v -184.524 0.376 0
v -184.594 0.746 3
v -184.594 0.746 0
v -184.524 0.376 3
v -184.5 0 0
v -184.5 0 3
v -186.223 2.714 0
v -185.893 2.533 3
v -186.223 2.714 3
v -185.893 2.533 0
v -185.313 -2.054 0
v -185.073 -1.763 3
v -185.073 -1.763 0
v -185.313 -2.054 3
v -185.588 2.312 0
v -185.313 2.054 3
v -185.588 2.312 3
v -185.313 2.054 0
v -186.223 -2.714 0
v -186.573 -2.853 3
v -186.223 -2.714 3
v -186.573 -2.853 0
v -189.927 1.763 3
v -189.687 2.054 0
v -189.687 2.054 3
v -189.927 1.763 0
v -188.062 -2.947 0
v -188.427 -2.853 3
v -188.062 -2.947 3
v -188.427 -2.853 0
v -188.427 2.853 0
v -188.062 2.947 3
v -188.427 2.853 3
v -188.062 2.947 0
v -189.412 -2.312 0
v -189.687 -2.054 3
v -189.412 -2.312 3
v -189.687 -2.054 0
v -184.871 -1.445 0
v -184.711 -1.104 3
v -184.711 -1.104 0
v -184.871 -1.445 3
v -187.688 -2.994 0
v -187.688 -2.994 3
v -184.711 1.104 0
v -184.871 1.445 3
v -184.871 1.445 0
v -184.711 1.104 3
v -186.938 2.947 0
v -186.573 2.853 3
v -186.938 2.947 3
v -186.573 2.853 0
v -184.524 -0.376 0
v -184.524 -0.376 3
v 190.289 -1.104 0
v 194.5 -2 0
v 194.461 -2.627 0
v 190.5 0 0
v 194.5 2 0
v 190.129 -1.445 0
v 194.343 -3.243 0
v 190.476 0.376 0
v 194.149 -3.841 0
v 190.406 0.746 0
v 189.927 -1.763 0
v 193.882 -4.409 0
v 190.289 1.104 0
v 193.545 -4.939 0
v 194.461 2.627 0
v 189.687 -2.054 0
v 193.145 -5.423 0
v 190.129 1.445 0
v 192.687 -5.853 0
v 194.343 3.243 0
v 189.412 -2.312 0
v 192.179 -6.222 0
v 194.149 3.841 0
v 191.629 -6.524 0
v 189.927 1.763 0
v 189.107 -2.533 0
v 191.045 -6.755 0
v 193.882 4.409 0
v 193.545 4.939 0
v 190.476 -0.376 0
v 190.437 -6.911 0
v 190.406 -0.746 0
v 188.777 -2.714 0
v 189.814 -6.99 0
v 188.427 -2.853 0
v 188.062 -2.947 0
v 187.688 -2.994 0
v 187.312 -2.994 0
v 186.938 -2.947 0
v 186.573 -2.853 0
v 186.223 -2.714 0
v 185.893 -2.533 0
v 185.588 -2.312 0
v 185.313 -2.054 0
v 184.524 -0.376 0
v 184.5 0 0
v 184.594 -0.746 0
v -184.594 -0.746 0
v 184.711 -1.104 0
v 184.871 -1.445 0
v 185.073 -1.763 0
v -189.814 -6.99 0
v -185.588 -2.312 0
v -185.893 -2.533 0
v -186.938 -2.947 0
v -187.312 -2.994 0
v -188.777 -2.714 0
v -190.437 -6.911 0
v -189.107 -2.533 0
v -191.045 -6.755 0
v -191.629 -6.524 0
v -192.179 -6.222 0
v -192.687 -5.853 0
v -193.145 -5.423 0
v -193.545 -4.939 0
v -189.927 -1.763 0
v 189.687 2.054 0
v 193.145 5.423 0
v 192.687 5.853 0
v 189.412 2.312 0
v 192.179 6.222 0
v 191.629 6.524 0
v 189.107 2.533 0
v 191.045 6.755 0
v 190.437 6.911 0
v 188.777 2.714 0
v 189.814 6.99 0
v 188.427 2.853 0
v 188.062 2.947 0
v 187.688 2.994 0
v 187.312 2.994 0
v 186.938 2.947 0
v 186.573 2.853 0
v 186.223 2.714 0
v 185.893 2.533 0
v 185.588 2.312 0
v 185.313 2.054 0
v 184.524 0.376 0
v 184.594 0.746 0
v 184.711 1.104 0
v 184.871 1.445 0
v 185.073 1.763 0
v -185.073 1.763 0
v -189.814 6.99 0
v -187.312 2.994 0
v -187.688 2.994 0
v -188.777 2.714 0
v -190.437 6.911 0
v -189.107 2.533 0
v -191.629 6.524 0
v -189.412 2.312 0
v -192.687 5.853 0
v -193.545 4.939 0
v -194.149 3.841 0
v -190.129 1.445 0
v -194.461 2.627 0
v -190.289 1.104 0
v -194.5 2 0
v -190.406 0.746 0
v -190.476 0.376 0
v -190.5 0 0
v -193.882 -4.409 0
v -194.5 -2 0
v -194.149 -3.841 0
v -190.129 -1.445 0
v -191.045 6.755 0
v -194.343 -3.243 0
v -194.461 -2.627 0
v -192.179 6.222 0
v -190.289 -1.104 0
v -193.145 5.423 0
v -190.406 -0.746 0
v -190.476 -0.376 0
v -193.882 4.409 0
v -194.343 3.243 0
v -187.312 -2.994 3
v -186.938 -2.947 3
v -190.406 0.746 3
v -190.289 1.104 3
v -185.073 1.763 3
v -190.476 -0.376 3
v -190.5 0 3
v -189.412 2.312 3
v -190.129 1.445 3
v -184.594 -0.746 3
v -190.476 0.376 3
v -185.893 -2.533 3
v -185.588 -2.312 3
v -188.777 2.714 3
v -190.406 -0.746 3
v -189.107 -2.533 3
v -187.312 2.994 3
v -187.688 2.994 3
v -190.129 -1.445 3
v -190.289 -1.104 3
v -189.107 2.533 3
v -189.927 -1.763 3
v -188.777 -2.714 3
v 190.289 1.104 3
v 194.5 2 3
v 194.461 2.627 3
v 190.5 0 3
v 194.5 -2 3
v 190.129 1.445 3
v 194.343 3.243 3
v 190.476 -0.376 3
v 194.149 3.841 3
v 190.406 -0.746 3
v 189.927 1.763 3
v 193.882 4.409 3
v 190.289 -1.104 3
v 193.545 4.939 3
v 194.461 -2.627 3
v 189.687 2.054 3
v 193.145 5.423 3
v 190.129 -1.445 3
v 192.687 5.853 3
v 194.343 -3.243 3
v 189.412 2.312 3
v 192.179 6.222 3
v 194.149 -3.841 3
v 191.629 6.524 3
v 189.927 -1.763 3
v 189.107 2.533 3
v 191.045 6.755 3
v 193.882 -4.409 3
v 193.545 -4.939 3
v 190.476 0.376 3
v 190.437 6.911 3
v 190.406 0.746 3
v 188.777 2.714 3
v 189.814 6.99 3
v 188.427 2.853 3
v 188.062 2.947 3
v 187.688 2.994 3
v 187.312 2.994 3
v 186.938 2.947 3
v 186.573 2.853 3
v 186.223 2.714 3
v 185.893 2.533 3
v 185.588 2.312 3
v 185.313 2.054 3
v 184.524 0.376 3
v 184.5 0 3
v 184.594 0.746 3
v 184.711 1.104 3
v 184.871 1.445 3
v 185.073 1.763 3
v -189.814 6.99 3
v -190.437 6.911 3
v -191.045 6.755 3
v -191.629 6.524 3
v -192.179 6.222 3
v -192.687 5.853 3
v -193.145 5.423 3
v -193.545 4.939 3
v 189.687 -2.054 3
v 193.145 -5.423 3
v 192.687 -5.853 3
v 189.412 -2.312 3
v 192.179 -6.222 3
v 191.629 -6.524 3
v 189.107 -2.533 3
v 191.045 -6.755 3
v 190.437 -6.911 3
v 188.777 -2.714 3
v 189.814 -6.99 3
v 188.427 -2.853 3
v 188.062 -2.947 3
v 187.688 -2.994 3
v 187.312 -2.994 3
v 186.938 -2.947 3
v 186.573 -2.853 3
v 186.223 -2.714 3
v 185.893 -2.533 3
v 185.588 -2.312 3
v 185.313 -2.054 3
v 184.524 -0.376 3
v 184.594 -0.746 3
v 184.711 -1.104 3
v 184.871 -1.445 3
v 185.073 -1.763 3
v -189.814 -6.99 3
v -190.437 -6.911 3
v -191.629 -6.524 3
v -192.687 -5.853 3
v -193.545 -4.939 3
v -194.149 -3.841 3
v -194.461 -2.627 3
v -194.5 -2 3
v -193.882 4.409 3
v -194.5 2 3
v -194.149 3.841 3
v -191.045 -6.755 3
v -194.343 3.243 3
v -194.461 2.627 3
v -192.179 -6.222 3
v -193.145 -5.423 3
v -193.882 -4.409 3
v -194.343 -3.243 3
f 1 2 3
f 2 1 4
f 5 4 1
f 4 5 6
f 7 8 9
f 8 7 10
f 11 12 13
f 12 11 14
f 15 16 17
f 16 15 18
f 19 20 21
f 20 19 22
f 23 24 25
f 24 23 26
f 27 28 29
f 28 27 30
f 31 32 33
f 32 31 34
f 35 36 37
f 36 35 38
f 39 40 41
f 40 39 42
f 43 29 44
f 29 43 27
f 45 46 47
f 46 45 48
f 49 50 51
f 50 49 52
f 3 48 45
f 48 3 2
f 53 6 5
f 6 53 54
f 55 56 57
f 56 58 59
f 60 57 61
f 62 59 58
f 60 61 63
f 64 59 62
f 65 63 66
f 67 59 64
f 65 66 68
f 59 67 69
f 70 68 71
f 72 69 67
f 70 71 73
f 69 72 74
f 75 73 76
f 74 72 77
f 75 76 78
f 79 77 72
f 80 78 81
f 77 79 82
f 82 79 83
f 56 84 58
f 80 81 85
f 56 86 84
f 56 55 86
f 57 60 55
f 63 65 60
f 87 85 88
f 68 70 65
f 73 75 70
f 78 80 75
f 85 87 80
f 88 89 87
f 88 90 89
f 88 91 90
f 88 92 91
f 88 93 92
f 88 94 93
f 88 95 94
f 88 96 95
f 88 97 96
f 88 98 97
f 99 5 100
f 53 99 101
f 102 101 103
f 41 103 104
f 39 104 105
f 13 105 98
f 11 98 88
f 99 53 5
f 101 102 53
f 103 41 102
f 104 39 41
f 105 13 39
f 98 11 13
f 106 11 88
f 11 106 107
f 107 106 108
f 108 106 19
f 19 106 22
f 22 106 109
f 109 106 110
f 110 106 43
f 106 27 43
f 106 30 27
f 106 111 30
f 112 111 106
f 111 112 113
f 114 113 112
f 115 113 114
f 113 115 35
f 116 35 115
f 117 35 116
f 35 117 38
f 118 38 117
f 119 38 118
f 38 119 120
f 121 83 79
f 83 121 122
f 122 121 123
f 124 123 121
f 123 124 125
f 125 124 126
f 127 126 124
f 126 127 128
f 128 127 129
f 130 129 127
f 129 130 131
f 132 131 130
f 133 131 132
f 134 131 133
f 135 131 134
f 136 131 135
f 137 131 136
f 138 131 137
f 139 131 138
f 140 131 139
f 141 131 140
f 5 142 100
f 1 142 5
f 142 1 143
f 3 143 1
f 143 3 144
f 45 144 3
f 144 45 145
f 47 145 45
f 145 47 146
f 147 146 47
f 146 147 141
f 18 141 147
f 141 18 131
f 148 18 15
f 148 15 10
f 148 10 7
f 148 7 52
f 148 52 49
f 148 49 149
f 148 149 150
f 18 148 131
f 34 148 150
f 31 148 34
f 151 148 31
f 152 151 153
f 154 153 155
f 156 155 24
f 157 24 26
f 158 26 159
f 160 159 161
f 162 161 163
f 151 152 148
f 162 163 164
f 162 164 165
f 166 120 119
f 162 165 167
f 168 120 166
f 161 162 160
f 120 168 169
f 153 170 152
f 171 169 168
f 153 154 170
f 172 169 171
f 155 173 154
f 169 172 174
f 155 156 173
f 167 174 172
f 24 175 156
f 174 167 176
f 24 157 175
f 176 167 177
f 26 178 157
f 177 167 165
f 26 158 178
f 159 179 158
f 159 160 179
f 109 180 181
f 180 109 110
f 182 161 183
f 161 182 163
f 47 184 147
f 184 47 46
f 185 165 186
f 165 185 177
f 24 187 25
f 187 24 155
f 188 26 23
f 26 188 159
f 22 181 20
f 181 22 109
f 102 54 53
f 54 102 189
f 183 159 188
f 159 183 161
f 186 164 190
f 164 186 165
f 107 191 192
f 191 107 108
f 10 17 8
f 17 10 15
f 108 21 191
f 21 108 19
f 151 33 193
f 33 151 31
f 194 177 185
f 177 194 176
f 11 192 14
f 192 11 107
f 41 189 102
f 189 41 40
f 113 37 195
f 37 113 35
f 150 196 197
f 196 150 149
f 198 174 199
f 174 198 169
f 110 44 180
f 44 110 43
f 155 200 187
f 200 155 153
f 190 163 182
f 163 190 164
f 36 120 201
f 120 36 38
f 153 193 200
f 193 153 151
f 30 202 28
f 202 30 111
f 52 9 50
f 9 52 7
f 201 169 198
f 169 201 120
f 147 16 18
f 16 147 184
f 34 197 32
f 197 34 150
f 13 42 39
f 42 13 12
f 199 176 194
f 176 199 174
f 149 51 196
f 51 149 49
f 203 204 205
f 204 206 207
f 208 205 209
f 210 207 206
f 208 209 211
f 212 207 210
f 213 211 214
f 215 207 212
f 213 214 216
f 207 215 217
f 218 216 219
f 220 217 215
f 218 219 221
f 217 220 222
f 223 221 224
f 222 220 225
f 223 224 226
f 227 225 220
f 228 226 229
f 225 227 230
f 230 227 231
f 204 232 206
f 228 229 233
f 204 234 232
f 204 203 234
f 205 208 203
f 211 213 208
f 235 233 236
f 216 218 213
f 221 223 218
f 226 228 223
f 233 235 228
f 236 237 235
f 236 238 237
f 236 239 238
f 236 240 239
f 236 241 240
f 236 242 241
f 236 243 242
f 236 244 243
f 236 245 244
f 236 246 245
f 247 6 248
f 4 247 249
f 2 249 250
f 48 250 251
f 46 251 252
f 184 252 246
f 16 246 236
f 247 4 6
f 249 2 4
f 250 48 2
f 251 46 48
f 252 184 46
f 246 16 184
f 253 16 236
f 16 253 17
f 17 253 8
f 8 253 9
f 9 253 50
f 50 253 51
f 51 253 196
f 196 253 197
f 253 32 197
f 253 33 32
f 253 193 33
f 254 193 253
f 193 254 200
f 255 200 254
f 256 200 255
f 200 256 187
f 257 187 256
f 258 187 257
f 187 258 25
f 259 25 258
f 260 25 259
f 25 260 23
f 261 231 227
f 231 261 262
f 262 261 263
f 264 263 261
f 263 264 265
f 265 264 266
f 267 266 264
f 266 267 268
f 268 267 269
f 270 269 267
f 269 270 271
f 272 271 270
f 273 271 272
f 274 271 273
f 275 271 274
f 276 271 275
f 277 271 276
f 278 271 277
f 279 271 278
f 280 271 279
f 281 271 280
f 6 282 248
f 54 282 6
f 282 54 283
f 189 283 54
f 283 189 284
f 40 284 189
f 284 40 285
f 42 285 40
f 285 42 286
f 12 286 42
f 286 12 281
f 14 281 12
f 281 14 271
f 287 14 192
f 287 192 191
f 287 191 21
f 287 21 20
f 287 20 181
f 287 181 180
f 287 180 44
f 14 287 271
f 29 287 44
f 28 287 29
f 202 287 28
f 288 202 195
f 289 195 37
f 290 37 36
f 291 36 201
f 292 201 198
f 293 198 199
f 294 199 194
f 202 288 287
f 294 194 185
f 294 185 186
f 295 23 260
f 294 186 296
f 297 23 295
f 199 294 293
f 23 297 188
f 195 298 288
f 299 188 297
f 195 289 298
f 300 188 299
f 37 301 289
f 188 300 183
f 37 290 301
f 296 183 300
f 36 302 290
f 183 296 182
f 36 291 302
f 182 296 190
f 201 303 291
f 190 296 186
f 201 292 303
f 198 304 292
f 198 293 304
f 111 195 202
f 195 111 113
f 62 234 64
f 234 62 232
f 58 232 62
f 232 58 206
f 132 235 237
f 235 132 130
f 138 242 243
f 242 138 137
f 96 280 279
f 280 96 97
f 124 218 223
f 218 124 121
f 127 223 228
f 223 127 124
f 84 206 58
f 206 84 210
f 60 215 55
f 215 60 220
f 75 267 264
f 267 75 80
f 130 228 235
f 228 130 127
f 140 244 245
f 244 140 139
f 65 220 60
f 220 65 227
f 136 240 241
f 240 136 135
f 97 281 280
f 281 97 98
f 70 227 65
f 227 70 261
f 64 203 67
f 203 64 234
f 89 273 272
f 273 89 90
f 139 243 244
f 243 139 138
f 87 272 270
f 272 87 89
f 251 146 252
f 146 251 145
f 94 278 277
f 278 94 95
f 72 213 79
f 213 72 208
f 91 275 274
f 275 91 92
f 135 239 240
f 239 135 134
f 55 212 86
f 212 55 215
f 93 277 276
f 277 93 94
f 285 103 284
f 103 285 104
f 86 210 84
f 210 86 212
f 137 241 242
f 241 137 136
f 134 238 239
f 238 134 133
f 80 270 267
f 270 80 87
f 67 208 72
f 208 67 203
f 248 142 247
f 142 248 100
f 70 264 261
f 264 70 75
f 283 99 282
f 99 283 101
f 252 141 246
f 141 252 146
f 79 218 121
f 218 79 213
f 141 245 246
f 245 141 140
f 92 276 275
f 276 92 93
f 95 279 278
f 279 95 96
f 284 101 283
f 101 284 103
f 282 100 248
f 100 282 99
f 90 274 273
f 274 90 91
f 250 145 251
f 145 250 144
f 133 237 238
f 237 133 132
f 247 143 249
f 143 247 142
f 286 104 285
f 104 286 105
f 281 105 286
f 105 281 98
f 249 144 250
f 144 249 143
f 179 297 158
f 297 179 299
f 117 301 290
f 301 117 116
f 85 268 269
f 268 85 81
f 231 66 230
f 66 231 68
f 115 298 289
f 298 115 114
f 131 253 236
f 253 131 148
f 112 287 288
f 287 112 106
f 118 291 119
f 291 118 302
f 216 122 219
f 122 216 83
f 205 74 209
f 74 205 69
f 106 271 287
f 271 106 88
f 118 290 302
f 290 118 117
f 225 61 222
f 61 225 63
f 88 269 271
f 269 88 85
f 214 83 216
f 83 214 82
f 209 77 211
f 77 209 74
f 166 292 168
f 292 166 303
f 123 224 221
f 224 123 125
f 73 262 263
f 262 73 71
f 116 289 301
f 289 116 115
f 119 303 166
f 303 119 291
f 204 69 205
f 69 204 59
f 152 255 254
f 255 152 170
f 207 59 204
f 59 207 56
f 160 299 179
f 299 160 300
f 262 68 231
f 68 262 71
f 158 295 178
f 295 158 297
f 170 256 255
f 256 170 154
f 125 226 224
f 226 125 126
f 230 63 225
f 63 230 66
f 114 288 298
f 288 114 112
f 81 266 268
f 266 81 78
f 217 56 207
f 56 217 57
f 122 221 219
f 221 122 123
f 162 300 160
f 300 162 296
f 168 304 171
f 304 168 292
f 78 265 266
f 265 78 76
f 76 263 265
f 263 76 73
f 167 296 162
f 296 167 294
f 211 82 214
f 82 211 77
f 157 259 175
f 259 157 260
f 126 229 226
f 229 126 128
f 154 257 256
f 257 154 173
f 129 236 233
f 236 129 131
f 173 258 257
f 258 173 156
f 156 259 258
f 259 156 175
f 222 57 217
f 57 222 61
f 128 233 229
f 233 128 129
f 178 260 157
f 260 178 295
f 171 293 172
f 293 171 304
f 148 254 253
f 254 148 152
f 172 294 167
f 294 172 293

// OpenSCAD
$fn = 50;


difference() {
	union() {
		hull() {
			translate(v = [-189.5000000000, 2.0000000000, 0]) {
				cylinder(h = 3, r = 5);
			}
			translate(v = [189.5000000000, 2.0000000000, 0]) {
				cylinder(h = 3, r = 5);
			}
			translate(v = [-189.5000000000, -2.0000000000, 0]) {
				cylinder(h = 3, r = 5);
			}
			translate(v = [189.5000000000, -2.0000000000, 0]) {
				cylinder(h = 3, r = 5);
			}
		}
	}
	union() {
		translate(v = [-187.5000000000, 0.0000000000, 0]) {
			cylinder(h = 3, r = 3.0000000000);
		}
		translate(v = [187.5000000000, 0.0000000000, 0]) {
			cylinder(h = 3, r = 3.0000000000);
		}
		translate(v = [-187.5000000000, 0.0000000000, 0]) {
			cylinder(h = 3, r = 1.5000000000);
		}
		translate(v = [187.5000000000, 0.0000000000, 0]) {
			cylinder(h = 3, r = 1.5000000000);
		}
		translate(v = [-187.5000000000, 0.0000000000, 0]) {
			cylinder(h = 3, r = 1.5000000000);
		}
		translate(v = [187.5000000000, 0.0000000000, 0]) {
			cylinder(h = 3, r = 1.5000000000);
		}
		translate(v = [-187.5000000000, 0.0000000000, 0]) {
			cylinder(h = 3, r = 1.5000000000);
		}
		translate(v = [187.5000000000, 0.0000000000, 0]) {
			cylinder(h = 3, r = 1.5000000000);
		}
	}
}
